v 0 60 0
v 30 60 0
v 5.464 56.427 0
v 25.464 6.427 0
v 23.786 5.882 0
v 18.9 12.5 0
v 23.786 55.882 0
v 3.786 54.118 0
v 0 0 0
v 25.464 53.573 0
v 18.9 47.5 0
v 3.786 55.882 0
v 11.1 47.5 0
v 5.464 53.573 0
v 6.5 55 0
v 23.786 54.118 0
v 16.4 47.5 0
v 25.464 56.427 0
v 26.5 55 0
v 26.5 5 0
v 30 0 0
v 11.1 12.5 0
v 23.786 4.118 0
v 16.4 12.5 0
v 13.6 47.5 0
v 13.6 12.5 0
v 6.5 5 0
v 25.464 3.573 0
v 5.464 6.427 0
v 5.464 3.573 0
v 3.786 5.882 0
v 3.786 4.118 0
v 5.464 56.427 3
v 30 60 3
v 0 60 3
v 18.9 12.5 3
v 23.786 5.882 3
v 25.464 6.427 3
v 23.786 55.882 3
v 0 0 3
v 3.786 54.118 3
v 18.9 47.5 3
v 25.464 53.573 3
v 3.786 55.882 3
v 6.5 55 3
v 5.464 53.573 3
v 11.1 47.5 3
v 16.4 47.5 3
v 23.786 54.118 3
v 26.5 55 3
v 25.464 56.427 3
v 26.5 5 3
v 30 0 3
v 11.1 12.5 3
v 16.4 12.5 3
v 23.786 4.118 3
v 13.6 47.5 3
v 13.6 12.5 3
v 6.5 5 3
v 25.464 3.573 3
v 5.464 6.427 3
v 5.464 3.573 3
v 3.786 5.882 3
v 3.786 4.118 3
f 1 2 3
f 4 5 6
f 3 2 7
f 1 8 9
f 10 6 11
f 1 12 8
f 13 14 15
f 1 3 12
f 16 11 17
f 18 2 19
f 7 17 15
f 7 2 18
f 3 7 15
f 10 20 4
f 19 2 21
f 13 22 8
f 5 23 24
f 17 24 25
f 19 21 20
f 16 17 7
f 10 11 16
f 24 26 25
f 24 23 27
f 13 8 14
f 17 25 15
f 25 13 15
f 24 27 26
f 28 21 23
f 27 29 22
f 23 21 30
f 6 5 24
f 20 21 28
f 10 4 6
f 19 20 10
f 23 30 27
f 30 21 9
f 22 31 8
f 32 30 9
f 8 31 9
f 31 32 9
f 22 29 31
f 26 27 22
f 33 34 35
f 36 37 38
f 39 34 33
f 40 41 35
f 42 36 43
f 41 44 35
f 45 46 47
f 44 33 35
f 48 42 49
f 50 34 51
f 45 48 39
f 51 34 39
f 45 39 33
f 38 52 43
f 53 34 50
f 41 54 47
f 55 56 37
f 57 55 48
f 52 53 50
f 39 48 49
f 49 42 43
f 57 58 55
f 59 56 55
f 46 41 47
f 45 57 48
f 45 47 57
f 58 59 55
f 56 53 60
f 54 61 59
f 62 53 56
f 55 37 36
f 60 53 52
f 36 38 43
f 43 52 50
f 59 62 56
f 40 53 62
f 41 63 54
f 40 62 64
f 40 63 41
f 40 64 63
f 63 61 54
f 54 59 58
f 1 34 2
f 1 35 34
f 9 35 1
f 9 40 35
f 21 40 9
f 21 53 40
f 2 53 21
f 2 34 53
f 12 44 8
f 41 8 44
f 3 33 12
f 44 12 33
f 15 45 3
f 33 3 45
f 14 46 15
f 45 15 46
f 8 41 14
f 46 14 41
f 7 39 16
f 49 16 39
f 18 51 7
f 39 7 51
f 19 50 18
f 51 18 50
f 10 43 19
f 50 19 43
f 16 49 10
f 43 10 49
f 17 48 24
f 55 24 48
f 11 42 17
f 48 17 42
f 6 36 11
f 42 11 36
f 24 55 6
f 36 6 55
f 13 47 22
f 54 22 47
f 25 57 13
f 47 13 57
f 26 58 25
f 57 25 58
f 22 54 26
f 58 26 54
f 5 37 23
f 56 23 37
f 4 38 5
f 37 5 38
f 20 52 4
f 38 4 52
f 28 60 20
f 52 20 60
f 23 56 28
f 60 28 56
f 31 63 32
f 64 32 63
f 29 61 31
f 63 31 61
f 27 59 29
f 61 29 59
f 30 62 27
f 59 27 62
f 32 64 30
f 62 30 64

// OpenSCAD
// file: bases/bm4.scad
module BM4_Base(size, height = 3) {
  linear_extrude(height=height) {
    difference() {
      square(size);
      union() {
        BM4_Sockets(size);
        children();
      }
    }
  }
}

module Magnet() {
  // d = default_magnet_diameter, offset = 0) {
  circle(d=3);
}

module BM4_Sockets(size, only_diagonal = false) {
  s = is_list(size) ? size : [size, size];

  translate([5, s[1] - 5]) Magnet();
  translate([s[0] - 5, 5]) Magnet();

  if (!only_diagonal) {
    translate([5, 5]) Magnet();
    translate([s[0] - 5, s[1] - 5]) Magnet();
  }
}

module HorseSlots(baseSize) {
  slotWidth = 2.5;
  slotLength = 35;
  slotSpacing = 2.8;
  translate(baseSize * 0.5) {
    translate([(slotSpacing + slotWidth) * 0.5, 0]) square([slotWidth, slotLength], center=true);
    translate([(slotSpacing + slotWidth) * -0.5, 0]) square([slotWidth, slotLength], center=true);
  }
}
// main file
use <bases/bm4.scad>

BM4_Base([30, 60]) {
  HorseSlots([30, 60]);
}
